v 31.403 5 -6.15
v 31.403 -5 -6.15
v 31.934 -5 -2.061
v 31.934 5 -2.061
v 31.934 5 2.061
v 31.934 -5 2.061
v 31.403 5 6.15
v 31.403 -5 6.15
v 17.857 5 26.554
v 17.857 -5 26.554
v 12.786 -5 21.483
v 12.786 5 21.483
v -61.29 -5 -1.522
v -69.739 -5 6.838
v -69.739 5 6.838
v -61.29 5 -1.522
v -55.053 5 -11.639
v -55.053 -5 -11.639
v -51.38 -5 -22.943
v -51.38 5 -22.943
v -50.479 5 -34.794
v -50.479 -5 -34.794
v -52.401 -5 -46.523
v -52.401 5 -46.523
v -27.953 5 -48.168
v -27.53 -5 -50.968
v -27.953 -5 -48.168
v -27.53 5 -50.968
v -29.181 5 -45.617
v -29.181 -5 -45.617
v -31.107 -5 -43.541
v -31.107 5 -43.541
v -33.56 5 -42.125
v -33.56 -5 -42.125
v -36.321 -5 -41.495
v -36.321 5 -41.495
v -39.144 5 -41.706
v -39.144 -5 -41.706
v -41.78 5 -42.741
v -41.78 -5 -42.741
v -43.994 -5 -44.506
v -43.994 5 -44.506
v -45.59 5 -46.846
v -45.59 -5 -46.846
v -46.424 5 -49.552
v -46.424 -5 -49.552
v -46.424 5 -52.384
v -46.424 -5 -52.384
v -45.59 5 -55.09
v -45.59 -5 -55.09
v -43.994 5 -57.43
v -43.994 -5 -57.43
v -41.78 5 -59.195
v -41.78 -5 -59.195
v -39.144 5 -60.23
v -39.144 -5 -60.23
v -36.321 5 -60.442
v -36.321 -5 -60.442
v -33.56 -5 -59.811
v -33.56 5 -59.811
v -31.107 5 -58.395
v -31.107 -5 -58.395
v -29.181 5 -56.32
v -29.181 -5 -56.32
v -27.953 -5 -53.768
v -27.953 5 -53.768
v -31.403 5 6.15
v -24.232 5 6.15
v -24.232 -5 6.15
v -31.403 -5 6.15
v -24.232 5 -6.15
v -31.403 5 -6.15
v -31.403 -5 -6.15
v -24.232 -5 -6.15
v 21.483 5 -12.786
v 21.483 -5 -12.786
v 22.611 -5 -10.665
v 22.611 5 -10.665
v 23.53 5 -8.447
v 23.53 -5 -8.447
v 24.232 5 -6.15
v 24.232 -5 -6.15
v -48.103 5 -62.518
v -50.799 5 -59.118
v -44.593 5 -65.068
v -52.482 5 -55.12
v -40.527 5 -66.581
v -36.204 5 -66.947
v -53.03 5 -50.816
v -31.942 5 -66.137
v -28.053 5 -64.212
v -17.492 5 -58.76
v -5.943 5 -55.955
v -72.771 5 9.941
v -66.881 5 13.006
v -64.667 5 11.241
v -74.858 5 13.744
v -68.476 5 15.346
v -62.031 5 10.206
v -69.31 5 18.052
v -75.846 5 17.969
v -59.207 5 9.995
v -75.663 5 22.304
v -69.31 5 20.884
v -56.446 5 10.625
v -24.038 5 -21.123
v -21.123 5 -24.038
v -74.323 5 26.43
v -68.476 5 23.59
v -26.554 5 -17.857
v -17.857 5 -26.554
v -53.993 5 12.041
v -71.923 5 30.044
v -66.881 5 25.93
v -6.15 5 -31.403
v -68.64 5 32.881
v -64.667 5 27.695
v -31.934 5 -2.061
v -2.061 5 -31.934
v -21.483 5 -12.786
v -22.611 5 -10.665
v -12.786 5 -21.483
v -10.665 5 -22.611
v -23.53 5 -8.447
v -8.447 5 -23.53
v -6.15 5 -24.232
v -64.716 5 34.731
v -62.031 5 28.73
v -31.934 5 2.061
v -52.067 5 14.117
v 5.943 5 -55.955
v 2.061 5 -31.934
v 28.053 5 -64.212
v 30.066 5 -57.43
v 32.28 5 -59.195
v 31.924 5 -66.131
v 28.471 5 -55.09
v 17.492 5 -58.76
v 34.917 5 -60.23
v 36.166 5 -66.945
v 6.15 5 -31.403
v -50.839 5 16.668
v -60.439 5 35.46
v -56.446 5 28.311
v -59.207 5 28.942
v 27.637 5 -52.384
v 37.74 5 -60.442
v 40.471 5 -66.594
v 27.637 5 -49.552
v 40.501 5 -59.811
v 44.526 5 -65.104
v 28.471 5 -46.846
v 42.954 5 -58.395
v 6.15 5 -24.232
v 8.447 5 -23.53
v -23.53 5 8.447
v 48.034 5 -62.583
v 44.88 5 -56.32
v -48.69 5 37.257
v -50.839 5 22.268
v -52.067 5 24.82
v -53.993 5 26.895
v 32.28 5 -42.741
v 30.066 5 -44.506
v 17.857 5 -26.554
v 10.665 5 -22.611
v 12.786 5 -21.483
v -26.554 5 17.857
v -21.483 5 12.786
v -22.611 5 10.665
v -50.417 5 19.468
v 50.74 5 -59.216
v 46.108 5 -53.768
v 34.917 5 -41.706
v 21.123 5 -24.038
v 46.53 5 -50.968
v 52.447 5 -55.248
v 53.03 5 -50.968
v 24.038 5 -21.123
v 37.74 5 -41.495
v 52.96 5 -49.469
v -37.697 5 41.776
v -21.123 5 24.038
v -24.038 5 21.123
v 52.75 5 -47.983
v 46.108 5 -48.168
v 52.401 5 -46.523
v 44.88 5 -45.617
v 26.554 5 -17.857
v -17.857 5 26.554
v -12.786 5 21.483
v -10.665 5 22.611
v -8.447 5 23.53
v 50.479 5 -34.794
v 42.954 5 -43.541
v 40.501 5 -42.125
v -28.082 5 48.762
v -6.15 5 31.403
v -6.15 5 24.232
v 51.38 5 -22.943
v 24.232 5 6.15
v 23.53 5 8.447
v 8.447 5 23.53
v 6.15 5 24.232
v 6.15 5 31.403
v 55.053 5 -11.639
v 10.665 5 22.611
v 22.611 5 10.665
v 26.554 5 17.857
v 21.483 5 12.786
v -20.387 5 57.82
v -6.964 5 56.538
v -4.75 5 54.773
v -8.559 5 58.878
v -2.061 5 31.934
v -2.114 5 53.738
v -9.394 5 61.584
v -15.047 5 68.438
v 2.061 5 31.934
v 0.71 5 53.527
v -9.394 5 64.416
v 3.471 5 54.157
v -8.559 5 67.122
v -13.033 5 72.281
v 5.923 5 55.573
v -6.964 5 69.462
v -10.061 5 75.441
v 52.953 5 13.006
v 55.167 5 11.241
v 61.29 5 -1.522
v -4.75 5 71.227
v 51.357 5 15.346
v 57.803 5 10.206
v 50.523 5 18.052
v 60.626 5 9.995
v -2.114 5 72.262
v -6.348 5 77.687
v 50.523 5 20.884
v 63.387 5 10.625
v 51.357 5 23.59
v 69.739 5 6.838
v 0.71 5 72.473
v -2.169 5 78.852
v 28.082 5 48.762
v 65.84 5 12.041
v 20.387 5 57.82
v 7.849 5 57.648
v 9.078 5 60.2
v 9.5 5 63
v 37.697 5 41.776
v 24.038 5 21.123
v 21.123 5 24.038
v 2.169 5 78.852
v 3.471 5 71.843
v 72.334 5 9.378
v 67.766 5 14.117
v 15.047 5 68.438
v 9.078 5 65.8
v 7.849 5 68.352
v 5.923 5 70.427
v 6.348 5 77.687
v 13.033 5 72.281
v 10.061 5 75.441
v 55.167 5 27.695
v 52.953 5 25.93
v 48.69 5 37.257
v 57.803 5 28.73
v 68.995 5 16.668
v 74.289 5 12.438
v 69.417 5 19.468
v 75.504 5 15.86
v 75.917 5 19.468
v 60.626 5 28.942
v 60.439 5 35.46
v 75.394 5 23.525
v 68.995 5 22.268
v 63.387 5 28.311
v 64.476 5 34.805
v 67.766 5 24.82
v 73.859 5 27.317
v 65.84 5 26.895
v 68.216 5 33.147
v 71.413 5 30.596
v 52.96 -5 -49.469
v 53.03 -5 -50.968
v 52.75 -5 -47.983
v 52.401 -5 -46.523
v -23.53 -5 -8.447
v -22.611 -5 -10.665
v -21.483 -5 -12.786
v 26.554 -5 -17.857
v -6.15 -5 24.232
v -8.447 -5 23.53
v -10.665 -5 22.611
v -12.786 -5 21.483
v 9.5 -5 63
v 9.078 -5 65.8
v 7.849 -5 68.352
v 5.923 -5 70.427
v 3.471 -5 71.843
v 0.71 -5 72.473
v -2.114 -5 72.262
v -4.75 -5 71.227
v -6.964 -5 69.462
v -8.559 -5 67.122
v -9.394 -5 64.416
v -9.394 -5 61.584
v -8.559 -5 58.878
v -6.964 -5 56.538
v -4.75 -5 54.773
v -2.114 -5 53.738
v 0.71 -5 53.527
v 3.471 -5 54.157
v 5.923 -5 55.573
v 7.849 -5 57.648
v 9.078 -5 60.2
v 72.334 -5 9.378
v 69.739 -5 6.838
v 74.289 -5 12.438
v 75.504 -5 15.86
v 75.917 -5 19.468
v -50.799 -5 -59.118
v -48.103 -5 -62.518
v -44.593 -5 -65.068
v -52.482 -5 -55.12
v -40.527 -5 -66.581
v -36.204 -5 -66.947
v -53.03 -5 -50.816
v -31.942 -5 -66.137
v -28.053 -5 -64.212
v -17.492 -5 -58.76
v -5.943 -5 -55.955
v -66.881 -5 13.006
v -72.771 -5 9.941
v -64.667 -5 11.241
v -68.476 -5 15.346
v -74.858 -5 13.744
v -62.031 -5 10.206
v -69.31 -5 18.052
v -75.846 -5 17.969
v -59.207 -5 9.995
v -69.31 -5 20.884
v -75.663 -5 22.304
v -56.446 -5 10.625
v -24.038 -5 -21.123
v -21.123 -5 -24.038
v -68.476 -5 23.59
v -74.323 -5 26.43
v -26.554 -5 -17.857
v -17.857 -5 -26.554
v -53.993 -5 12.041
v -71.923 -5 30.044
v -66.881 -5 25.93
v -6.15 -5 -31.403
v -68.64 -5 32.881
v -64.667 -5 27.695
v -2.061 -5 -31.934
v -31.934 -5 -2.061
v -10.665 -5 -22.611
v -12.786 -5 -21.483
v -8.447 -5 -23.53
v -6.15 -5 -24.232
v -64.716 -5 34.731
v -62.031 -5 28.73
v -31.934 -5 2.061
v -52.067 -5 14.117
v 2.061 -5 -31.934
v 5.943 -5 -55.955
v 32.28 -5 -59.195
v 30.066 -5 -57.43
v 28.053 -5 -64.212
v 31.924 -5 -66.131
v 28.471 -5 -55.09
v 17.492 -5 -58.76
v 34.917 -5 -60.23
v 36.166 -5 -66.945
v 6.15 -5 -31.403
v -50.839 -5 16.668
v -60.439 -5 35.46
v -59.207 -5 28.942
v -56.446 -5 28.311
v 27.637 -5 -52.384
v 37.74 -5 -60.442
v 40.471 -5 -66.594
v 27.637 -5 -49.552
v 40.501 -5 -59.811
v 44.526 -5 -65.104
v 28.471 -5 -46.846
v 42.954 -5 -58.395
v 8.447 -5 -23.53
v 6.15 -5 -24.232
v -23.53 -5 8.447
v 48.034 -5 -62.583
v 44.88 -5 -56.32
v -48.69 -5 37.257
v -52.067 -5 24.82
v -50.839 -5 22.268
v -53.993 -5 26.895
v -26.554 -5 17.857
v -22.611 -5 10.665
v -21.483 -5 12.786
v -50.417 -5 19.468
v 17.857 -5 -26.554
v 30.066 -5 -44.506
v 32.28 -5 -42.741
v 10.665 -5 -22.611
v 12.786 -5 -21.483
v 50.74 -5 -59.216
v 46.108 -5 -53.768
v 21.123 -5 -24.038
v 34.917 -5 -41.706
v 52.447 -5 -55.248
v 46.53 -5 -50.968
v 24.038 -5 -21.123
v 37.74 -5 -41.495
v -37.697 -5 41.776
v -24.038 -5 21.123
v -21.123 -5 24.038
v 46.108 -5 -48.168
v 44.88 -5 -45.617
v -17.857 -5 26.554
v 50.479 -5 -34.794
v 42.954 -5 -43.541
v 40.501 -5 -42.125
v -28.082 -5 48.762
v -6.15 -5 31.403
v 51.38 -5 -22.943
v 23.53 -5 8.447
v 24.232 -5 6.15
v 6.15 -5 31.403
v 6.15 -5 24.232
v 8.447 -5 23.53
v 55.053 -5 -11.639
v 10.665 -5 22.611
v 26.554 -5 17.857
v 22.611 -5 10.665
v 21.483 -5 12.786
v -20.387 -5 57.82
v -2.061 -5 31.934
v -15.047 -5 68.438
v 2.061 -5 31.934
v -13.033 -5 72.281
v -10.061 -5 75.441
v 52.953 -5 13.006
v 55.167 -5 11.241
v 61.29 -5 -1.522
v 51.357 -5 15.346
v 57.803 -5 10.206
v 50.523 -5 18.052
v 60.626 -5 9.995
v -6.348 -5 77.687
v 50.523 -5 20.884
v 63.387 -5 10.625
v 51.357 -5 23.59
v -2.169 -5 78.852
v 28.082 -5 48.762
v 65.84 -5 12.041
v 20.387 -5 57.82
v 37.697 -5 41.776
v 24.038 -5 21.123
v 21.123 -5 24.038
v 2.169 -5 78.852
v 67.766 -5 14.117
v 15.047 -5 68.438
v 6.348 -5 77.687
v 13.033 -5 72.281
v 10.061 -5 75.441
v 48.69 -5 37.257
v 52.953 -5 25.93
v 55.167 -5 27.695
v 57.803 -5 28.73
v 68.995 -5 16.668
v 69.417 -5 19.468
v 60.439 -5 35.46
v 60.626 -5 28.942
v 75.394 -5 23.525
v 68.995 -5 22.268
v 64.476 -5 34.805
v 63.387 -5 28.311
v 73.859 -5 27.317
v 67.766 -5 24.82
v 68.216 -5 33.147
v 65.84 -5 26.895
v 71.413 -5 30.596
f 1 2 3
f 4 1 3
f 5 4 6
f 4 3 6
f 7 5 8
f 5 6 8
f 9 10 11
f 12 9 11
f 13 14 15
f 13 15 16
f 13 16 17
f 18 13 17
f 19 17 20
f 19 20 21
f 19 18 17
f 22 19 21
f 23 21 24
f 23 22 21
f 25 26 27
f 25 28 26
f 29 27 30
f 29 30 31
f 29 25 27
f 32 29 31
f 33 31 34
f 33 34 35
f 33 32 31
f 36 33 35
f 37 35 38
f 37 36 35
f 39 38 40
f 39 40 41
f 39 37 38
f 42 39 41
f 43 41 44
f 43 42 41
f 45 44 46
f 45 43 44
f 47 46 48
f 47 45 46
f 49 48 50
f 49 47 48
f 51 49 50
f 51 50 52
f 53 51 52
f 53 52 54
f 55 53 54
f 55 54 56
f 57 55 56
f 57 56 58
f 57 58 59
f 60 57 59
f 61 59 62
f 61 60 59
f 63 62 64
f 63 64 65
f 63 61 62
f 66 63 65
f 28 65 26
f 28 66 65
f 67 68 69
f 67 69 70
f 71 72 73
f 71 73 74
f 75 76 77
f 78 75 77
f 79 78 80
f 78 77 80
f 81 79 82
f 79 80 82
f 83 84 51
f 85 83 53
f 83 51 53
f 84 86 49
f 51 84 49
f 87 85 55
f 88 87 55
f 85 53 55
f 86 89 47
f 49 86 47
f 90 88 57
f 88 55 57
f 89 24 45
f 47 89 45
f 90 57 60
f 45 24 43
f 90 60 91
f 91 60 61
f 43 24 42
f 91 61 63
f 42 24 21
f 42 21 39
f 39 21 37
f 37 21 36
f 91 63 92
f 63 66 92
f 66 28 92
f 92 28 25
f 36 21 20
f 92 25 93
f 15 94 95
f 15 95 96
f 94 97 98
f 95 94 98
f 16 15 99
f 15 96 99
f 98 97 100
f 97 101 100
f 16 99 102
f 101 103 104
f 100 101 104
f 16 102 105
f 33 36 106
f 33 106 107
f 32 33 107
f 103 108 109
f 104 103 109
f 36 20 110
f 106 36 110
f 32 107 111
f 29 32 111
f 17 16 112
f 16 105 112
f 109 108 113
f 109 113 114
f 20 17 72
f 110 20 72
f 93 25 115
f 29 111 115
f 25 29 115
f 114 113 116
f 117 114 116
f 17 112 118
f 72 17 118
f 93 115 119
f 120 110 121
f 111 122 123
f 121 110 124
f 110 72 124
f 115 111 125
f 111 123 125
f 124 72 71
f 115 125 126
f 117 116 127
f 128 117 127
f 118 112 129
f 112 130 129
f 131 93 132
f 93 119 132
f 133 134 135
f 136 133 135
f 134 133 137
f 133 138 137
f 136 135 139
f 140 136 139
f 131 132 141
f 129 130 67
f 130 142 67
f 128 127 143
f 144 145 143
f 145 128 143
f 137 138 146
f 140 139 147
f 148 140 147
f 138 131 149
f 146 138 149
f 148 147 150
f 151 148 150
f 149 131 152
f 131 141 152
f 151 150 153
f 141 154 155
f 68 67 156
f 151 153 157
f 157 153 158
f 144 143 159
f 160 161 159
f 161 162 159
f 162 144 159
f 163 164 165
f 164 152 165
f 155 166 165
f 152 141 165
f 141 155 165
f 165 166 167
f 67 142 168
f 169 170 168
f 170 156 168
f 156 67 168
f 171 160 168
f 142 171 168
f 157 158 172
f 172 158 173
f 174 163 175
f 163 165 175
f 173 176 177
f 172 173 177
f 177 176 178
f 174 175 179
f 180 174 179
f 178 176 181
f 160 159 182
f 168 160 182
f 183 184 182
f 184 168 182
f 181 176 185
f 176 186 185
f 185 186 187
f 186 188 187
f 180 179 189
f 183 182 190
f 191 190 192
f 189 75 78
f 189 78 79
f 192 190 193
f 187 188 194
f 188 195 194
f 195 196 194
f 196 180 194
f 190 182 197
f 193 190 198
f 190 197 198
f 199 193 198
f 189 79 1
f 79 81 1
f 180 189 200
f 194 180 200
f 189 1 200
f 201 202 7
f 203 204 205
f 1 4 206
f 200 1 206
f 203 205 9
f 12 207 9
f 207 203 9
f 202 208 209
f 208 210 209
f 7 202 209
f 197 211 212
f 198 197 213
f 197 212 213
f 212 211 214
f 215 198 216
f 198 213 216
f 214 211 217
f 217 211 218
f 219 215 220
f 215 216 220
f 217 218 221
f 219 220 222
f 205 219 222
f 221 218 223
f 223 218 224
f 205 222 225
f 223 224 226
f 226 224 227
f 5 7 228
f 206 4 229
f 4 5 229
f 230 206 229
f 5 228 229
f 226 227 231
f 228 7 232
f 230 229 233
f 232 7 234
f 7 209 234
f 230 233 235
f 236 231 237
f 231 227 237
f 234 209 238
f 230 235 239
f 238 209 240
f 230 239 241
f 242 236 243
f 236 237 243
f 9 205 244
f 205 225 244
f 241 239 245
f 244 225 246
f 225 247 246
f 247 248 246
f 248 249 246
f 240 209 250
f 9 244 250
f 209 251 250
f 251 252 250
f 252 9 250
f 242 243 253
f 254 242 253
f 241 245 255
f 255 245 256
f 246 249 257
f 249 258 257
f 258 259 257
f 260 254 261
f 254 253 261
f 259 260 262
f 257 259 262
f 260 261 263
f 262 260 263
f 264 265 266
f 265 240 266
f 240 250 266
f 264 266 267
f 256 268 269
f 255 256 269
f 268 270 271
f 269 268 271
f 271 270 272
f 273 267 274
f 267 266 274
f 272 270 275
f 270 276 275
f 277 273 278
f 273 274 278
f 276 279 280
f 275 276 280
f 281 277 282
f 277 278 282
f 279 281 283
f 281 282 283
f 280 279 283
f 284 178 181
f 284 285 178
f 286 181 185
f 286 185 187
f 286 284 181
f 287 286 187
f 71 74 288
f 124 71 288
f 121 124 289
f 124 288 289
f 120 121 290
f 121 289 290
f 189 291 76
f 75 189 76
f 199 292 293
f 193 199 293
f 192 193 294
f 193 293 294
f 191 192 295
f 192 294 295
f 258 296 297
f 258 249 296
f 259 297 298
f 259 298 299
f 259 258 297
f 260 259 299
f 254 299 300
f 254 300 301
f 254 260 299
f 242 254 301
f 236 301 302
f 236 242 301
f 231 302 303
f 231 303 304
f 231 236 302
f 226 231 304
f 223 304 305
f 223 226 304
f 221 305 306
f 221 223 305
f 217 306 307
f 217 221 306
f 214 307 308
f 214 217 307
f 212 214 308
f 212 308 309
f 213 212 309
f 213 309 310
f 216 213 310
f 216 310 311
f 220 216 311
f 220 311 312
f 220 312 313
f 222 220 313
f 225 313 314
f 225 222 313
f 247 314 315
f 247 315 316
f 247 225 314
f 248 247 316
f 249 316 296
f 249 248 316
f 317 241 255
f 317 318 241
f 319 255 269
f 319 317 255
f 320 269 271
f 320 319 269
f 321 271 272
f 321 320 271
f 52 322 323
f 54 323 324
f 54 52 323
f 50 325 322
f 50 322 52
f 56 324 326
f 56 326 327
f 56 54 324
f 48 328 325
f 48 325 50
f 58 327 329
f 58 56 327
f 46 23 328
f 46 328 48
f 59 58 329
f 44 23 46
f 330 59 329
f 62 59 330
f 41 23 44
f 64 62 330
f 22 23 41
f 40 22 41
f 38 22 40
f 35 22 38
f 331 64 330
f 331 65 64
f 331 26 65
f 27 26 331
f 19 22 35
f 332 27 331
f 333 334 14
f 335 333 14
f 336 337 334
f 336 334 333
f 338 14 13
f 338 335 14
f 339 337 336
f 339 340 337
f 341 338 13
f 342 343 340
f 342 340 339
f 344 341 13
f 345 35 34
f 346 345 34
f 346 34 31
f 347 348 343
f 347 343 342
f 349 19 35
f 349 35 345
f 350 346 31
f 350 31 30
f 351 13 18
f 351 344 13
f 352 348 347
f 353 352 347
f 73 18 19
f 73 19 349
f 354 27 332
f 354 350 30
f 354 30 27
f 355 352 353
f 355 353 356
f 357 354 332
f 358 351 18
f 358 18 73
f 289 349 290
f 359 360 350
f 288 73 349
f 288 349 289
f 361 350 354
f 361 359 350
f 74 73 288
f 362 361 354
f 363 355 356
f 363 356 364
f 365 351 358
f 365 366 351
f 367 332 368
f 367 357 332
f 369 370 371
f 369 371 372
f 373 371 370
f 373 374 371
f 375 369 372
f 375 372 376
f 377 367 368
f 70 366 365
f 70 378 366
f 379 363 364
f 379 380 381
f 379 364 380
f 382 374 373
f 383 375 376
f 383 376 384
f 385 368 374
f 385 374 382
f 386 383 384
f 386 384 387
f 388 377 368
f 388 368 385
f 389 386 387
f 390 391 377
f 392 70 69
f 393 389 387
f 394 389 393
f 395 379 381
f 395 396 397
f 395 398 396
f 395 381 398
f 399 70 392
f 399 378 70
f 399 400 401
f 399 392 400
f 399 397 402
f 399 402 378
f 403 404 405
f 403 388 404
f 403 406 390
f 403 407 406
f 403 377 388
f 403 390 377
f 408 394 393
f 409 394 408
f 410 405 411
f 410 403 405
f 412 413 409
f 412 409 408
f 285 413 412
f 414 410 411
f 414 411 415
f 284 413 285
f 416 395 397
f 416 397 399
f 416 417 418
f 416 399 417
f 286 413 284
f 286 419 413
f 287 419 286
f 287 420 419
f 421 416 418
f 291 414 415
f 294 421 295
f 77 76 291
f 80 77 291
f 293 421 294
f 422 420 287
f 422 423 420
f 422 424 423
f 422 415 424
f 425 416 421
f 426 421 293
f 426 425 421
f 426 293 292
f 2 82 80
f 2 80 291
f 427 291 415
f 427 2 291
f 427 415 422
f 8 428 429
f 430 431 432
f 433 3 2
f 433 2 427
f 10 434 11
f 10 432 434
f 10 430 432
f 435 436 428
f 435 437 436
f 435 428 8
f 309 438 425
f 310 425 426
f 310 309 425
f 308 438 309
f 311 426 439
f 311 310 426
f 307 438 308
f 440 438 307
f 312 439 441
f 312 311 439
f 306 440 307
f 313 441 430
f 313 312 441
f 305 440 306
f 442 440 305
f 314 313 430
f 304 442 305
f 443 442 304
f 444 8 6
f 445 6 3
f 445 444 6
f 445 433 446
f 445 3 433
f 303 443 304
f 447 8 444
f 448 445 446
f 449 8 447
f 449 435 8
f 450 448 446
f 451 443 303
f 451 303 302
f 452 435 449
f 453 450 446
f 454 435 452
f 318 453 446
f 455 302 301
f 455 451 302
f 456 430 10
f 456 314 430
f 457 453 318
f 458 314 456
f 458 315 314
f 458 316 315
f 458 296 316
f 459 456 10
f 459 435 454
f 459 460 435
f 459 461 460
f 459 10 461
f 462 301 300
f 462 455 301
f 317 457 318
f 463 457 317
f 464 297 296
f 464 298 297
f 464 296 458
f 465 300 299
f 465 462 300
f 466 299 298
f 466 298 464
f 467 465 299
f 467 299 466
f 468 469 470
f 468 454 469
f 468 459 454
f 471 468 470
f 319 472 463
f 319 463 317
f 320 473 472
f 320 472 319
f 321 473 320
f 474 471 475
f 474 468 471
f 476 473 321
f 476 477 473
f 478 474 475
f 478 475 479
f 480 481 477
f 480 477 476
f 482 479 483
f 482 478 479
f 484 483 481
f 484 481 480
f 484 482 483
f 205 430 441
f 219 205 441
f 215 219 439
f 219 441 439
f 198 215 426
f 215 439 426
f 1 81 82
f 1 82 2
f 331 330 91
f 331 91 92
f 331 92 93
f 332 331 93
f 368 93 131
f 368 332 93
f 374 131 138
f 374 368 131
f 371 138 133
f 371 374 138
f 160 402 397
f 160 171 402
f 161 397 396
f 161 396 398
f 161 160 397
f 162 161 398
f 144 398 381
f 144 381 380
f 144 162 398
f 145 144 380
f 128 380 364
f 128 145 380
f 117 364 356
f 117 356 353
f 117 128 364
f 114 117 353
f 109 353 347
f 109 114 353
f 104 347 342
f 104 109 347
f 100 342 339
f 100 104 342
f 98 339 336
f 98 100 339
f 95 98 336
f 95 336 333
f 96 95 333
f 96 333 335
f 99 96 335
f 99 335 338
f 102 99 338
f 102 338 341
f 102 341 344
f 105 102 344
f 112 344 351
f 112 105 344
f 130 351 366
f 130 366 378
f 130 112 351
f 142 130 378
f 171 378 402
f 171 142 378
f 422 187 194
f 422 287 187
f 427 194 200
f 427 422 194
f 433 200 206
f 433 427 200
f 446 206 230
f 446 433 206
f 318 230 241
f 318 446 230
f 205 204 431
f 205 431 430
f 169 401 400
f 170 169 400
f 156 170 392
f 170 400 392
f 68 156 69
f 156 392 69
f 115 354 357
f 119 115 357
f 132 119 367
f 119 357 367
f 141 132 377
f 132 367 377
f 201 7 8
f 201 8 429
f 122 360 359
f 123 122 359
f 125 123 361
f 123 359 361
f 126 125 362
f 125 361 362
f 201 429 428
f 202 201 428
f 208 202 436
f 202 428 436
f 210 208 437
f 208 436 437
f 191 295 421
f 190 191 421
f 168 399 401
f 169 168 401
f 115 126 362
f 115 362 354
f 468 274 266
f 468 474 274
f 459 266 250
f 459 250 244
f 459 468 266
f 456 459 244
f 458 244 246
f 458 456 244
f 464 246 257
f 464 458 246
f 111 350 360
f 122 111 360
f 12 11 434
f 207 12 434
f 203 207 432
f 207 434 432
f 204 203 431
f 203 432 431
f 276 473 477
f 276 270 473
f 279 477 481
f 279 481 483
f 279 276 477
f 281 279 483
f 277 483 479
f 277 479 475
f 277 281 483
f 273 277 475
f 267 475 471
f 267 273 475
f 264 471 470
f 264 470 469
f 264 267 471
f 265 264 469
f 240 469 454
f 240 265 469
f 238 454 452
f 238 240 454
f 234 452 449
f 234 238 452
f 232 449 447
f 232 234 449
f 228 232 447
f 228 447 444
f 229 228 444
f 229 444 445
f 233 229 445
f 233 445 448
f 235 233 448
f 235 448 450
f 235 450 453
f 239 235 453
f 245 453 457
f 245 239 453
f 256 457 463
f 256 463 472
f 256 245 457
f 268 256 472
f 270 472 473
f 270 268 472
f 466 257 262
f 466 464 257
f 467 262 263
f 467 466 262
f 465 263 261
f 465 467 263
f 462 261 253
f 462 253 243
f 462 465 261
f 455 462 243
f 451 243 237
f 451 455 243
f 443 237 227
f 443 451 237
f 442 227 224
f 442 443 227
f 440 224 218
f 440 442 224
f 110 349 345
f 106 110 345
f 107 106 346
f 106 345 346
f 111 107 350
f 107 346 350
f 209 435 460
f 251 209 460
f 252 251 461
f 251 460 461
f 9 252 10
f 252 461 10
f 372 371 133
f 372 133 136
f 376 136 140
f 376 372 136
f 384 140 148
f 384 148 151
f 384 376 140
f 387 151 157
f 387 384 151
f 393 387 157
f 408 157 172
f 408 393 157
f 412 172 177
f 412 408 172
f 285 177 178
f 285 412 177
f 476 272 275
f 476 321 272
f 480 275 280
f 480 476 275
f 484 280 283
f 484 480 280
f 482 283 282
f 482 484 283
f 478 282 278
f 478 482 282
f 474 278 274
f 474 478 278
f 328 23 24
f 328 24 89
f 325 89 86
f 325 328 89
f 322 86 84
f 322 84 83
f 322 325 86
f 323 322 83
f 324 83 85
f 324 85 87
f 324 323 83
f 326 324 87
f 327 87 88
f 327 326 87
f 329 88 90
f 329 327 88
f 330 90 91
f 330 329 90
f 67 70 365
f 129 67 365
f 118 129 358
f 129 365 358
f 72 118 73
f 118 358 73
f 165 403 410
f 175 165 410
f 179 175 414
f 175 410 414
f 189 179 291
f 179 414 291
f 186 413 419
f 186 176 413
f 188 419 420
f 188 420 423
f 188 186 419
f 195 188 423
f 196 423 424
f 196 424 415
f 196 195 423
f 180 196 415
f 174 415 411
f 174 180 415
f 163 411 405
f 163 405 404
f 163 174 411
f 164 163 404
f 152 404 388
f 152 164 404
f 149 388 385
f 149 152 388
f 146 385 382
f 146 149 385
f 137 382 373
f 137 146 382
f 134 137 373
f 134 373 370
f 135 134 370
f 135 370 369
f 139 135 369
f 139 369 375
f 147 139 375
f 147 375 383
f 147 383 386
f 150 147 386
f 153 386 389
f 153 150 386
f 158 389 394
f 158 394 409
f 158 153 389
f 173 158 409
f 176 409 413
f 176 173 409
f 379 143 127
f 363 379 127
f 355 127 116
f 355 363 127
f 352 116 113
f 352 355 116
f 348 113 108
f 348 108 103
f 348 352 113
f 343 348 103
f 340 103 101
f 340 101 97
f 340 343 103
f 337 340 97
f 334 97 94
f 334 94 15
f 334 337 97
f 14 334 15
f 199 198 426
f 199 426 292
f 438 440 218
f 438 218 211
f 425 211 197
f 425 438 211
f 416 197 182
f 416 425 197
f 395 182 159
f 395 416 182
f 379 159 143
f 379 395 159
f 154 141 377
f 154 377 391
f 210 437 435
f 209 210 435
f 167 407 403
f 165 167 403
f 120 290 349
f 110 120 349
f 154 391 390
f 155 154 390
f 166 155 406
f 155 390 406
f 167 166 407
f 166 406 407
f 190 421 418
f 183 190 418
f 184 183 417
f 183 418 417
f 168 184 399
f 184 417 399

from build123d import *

# Parameters (mm, degrees)
F0_R     = 9.5
F1_DEPTH = 5
F3_DEPTH = 25


with BuildPart() as f1:
    # F0 (on Front) → F1 (new body, symmetric)
    with BuildSketch(Plane.XZ):
        with BuildLine():
            ThreePointArc((-15.047428, 68.438281), (-2.760539, 47.239942), (16, 63))
            ThreePointArc((16, 63), (15.760058, 65.760539), (15.047428, 68.438281))
            ThreePointArc((15.047428, 68.438281), (0, 79), (-15.047428, 68.438281))
        make_face()
        with Locations((0, 63)):
            Circle(F0_R, mode=Mode.SUBTRACT)
        with BuildLine():
            ThreePointArc((15.047428, 68.438281), (15.760058, 65.760539), (16, 63))
            ThreePointArc((16, 63), (-2.760539, 47.239942), (-15.047428, 68.438281))
            ThreePointArc((-15.047428, 68.438281), (-32.681379, 44.98206), (-60.438762, 35.459547))
            ThreePointArc((-60.438762, 35.459547), (-48.78901, 30.964923), (-43.916561, 19.468071))
            ThreePointArc((-43.916561, 19.468071), (-52.886354, 5.095312), (-69.738584, 6.837637))
            ThreePointArc((-69.738584, 6.837637), (-52.879582, -17.181618), (-52.400638, -46.523076))
            ThreePointArc((-52.400638, -46.523076), (-34.785773, -35.126311), (-21.030471, -50.968071))
            ThreePointArc((-21.030471, -50.968071), (-22.894818, -58.463625), (-28.053387, -64.212389))
            ThreePointArc((-28.053387, -64.212389), (0, -55.600883), (28.053387, -64.212389))
            ThreePointArc((28.053387, -64.212389), (27.625907, -38.023799), (52.400638, -46.523076))
            ThreePointArc((52.400638, -46.523076), (52.879582, -17.181618), (69.738584, 6.837637))
            ThreePointArc((69.738584, 6.837637), (44.699656, 14.523799), (60.438762, 35.459547))
            ThreePointArc((60.438762, 35.459547), (32.681379, 44.98206), (15.047428, 68.438281))
        make_face()
        with BuildLine():
            ThreePointArc((75.916561, 19.468071), (71.413413, 30.595621), (60.438762, 35.459547))
            ThreePointArc((60.438762, 35.459547), (44.699656, 14.523799), (69.738584, 6.837637))
            ThreePointArc((69.738584, 6.837637), (74.289319, 12.437864), (75.916561, 19.468071))
        make_face()
        with Locations((59.916561, 19.468071)):
            Circle(F0_R, mode=Mode.SUBTRACT)
        with BuildLine():
            ThreePointArc((-43.916561, 19.468071), (-48.78901, 30.964923), (-60.438762, 35.459547))
            ThreePointArc((-60.438762, 35.459547), (-75.133465, 24.412343), (-69.738584, 6.837637))
            ThreePointArc((-69.738584, 6.837637), (-52.886354, 5.095312), (-43.916561, 19.468071))
        make_face()
        with Locations((-59.916561, 19.468071)):
            Circle(F0_R, mode=Mode.SUBTRACT)
        with BuildLine():
            ThreePointArc((53.030471, -50.968071), (52.87223, -48.723373), (52.400638, -46.523076))
            ThreePointArc((52.400638, -46.523076), (27.625907, -38.023799), (28.053387, -64.212389))
            ThreePointArc((28.053387, -64.212389), (44.526025, -65.103723), (53.030471, -50.968071))
        make_face()
        with Locations((37.030471, -50.968071)):
            Circle(F0_R, mode=Mode.SUBTRACT)
        with BuildLine():
            ThreePointArc((-21.030471, -50.968071), (-34.785773, -35.126311), (-52.400638, -46.523076))
            ThreePointArc((-52.400638, -46.523076), (-46.435035, -63.912343), (-28.053387, -64.212389))
            ThreePointArc((-28.053387, -64.212389), (-22.894818, -58.463625), (-21.030471, -50.968071))
        make_face()
        with Locations((-37.030471, -50.968071)):
            Circle(F0_R, mode=Mode.SUBTRACT)
    extrude(amount=F1_DEPTH, both=True)

    # F2 (on face) → F3 (cut)
    with BuildSketch(Plane.XZ.offset(5)):
        with BuildLine():
            Line((21.483138, 12.785725), (26.554308, 17.856895))
            ThreePointArc((26.554308, 17.856895), (22.627417, 22.627417), (17.856895, 26.554308))
            Line((17.856895, 26.554308), (12.785725, 21.483138))
            ThreePointArc((12.785725, 21.483138), (9.567086, 23.096988), (6.15, 24.231746))
            Line((6.15, 24.231746), (6.15, 31.403463))
            ThreePointArc((6.15, 31.403463), (0, 32), (-6.15, 31.403463))
            Line((-6.15, 31.403463), (-6.15, 24.231746))
            ThreePointArc((-6.15, 24.231746), (-9.567086, 23.096988), (-12.785725, 21.483138))
            Line((-12.785725, 21.483138), (-17.856895, 26.554308))
            ThreePointArc((-17.856895, 26.554308), (-22.627417, 22.627417), (-26.554308, 17.856895))
            Line((-26.554308, 17.856895), (-21.483138, 12.785725))
            ThreePointArc((-21.483138, 12.785725), (-23.096988, 9.567086), (-24.231746, 6.15))
            Line((-24.231746, 6.15), (-31.403463, 6.15))
            ThreePointArc((-31.403463, 6.15), (-32, 0), (-31.403463, -6.15))
            Line((-31.403463, -6.15), (-24.231746, -6.15))
            ThreePointArc((-24.231746, -6.15), (-23.096988, -9.567086), (-21.483138, -12.785725))
            Line((-21.483138, -12.785725), (-26.554308, -17.856895))
            ThreePointArc((-26.554308, -17.856895), (-22.627417, -22.627417), (-17.856895, -26.554308))
            Line((-17.856895, -26.554308), (-12.785725, -21.483138))
            ThreePointArc((-12.785725, -21.483138), (-9.567086, -23.096988), (-6.15, -24.231746))
            Line((-6.15, -24.231746), (-6.15, -31.403463))
            ThreePointArc((-6.15, -31.403463), (0, -32), (6.15, -31.403463))
            Line((6.15, -31.403463), (6.15, -24.231746))
            ThreePointArc((6.15, -24.231746), (9.567086, -23.096988), (12.785725, -21.483138))
            Line((12.785725, -21.483138), (17.856895, -26.554308))
            ThreePointArc((17.856895, -26.554308), (22.627417, -22.627417), (26.554308, -17.856895))
            Line((26.554308, -17.856895), (21.483138, -12.785725))
            ThreePointArc((21.483138, -12.785725), (23.096988, -9.567086), (24.231746, -6.15))
            Line((24.231746, -6.15), (31.403463, -6.15))
            ThreePointArc((31.403463, -6.15), (32, 0), (31.403463, 6.15))
            Line((31.403463, 6.15), (24.231746, 6.15))
            ThreePointArc((24.231746, 6.15), (23.096988, 9.567086), (21.483138, 12.785725))
        make_face()
    extrude(amount=-F3_DEPTH, mode=Mode.SUBTRACT)


solid = f1.part
